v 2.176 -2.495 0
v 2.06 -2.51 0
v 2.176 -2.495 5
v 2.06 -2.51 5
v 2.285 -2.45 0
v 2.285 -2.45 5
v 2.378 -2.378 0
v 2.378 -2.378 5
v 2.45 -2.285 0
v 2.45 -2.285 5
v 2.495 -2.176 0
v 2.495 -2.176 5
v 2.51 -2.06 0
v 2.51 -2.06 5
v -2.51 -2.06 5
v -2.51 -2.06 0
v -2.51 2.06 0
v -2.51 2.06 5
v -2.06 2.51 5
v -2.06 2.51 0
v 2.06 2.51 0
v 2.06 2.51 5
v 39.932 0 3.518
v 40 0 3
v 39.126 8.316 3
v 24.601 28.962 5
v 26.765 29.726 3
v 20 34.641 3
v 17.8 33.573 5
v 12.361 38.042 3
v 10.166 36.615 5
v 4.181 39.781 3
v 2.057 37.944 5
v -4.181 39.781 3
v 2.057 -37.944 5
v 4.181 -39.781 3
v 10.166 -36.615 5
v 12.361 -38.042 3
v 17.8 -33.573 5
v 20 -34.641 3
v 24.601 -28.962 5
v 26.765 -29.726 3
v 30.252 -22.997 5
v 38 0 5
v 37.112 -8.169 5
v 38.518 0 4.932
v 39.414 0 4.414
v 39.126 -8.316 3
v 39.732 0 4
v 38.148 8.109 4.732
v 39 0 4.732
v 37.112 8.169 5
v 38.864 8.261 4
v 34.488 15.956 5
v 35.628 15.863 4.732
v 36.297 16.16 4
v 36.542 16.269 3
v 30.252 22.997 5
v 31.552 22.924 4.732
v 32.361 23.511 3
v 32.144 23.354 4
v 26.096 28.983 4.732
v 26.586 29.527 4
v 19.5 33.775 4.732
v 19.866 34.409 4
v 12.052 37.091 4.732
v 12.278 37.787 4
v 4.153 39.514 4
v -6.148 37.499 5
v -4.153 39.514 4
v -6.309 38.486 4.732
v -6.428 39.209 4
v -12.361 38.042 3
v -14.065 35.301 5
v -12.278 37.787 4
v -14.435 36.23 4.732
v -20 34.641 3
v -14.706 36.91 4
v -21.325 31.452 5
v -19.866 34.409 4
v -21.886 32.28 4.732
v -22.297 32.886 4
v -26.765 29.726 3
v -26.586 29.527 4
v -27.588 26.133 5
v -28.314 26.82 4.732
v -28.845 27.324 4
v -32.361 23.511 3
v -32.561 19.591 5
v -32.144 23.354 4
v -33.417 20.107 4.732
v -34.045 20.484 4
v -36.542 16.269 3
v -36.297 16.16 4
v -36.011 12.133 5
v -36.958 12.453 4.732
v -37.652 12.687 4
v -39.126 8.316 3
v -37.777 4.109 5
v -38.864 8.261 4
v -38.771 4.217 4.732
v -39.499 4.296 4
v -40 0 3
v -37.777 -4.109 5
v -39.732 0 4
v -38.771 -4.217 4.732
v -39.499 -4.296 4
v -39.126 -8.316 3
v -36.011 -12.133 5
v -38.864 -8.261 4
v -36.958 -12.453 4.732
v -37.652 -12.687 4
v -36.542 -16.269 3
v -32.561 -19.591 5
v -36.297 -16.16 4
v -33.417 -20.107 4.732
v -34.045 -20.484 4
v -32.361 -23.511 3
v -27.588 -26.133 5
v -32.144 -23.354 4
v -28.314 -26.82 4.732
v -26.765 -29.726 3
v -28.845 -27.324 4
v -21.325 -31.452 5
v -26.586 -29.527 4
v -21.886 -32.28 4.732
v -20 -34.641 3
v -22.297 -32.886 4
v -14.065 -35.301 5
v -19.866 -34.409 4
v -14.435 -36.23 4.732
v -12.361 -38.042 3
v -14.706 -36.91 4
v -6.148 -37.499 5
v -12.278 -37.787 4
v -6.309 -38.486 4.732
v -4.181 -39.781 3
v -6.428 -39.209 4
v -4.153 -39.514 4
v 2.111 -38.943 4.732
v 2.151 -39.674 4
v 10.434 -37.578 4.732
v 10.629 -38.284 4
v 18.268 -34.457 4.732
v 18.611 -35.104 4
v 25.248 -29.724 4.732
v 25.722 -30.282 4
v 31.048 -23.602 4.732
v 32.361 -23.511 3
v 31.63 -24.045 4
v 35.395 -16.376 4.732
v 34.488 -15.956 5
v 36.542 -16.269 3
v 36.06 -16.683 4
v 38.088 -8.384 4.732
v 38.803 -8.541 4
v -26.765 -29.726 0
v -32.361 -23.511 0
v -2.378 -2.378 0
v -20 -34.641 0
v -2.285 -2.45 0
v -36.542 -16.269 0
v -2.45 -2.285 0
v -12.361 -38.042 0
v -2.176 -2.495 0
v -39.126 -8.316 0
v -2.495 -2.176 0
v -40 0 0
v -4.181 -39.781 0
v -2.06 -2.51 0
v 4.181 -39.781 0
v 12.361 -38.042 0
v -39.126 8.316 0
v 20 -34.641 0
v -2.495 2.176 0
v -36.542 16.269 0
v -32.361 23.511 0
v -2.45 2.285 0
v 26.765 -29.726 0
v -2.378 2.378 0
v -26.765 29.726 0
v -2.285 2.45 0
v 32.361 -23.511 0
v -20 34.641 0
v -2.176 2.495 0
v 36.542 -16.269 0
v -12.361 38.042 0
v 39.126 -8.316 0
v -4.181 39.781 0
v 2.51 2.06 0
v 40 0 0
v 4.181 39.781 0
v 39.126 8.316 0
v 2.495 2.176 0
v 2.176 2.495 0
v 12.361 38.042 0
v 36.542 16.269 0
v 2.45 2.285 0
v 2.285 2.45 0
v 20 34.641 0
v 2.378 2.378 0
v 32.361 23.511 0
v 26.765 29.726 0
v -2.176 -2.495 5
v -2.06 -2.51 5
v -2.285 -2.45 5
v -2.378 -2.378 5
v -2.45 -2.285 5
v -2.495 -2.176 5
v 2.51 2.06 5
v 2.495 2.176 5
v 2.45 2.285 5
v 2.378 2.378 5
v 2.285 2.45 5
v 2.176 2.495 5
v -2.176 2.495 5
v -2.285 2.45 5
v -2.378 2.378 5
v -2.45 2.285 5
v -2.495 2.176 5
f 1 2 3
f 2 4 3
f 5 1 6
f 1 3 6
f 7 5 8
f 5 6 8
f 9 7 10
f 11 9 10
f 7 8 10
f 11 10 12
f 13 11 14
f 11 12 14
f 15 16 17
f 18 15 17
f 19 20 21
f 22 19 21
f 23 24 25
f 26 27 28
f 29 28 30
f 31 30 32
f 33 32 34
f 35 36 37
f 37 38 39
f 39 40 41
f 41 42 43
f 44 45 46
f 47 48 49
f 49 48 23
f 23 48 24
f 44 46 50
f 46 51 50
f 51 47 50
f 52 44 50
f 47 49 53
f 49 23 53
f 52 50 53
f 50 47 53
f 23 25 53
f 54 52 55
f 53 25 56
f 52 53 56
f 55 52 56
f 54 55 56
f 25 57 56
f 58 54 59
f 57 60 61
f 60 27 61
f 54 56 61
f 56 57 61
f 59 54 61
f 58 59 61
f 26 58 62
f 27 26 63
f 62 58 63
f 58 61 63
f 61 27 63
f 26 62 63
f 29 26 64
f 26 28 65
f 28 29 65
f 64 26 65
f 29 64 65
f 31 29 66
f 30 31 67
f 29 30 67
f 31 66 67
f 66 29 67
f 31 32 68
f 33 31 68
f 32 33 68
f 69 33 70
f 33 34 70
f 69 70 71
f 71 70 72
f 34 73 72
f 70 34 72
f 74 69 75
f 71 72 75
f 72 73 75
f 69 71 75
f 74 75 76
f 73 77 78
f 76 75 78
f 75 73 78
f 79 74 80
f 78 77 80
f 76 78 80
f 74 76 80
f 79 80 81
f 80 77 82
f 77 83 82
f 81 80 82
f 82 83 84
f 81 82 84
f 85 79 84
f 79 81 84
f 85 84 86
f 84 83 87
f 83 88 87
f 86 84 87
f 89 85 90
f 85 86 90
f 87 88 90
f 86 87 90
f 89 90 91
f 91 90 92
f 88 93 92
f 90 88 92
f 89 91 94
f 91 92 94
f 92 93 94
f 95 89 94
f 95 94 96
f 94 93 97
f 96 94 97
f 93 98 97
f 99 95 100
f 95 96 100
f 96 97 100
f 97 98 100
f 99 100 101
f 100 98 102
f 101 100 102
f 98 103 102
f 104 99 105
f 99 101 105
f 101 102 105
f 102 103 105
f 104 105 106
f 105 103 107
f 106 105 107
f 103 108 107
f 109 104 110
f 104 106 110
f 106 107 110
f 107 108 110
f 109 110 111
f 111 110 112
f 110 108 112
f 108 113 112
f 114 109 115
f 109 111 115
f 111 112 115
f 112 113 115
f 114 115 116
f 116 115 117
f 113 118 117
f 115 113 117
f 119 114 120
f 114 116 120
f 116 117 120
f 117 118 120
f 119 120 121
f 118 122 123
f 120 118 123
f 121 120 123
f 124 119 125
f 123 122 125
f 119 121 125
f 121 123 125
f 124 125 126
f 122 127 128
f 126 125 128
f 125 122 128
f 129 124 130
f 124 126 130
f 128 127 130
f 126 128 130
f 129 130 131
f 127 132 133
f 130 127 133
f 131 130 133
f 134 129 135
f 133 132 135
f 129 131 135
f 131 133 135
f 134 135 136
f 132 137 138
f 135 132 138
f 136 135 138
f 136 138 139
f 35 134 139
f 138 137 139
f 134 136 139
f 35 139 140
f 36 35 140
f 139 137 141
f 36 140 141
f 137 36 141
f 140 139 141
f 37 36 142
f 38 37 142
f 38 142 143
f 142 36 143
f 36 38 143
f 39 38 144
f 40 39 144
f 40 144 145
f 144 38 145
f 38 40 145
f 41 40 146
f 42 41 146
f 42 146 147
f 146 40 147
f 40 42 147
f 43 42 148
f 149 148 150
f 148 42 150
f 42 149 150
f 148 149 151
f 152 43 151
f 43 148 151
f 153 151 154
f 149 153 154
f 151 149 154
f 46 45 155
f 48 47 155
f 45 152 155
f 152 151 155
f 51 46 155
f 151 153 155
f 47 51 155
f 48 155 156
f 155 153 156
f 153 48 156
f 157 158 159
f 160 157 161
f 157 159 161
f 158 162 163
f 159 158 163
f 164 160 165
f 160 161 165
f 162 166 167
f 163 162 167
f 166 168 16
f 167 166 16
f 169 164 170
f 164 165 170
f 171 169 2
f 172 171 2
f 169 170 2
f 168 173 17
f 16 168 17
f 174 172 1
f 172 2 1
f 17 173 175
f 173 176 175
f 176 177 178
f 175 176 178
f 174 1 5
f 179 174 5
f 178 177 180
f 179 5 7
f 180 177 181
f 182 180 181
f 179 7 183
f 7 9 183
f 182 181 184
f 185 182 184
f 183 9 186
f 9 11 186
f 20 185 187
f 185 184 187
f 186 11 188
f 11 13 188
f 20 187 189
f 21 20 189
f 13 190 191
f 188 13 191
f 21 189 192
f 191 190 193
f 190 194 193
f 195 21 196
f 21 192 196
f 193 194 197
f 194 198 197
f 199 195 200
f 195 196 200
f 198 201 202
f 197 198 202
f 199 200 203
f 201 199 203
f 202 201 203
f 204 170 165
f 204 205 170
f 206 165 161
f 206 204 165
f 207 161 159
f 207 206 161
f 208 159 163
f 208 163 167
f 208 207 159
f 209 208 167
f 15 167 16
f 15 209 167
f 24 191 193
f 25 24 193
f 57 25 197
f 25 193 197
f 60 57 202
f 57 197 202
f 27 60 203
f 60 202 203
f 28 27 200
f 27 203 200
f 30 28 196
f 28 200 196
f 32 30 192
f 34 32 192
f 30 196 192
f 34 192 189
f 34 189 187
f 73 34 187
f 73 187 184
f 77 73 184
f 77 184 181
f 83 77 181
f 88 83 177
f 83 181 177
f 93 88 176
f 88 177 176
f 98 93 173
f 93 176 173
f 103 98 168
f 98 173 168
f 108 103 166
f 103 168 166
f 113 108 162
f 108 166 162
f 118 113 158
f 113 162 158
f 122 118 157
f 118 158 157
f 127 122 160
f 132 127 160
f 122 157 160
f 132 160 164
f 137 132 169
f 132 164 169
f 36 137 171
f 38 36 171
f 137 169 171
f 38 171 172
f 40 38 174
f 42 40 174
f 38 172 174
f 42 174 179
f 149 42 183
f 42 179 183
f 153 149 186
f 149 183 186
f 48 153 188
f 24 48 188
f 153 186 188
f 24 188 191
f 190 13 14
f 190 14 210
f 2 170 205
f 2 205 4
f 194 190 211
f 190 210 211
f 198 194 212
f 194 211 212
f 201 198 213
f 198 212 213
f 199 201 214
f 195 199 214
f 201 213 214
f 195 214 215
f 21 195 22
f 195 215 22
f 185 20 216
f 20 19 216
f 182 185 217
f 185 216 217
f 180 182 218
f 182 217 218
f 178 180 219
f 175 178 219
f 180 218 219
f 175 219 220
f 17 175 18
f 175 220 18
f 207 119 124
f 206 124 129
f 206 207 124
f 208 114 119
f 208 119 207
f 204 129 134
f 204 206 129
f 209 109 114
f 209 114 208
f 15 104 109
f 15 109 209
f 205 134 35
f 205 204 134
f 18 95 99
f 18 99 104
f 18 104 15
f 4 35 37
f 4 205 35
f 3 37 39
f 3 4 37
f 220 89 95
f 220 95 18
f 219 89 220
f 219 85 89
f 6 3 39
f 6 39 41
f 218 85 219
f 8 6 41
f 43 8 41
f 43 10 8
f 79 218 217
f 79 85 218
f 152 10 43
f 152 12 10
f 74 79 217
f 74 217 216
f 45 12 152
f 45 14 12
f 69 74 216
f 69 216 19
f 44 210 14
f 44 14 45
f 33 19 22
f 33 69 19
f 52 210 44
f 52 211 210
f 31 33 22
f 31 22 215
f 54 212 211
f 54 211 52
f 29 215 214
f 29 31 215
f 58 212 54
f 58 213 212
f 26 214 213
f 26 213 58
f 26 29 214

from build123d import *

# Parameters (mm, degrees)
F0_R     = 40
F0_W     = 5.02
F0_H     = 5.02
F1_DEPTH = 5
F2_R     = 0.45
F3_R     = 2


with BuildPart() as f1:
    # F0 (on Top) → F1 (new body)
    with BuildSketch(Plane.XY):
        Circle(F0_R)
        Rectangle(F0_W, F0_H, mode=Mode.SUBTRACT)
    extrude(amount=F1_DEPTH)

    # F2
    f2_edges = [f1.edges().sort_by_distance(p)[0] for p in [
        (-2.51, 2.51, 2.5),
        (-2.51, -2.51, 2.5),
        (2.51, -2.51, 2.5),
        (2.51, 2.51, 2.5),
    ]]
    fillet(f2_edges, radius=F2_R)

    # F3
    f3_edges = [f1.edges().sort_by_distance(p)[0] for p in [
        (-40, 0, 5),
    ]]
    fillet(f3_edges, radius=F3_R)


solid = f1.part
